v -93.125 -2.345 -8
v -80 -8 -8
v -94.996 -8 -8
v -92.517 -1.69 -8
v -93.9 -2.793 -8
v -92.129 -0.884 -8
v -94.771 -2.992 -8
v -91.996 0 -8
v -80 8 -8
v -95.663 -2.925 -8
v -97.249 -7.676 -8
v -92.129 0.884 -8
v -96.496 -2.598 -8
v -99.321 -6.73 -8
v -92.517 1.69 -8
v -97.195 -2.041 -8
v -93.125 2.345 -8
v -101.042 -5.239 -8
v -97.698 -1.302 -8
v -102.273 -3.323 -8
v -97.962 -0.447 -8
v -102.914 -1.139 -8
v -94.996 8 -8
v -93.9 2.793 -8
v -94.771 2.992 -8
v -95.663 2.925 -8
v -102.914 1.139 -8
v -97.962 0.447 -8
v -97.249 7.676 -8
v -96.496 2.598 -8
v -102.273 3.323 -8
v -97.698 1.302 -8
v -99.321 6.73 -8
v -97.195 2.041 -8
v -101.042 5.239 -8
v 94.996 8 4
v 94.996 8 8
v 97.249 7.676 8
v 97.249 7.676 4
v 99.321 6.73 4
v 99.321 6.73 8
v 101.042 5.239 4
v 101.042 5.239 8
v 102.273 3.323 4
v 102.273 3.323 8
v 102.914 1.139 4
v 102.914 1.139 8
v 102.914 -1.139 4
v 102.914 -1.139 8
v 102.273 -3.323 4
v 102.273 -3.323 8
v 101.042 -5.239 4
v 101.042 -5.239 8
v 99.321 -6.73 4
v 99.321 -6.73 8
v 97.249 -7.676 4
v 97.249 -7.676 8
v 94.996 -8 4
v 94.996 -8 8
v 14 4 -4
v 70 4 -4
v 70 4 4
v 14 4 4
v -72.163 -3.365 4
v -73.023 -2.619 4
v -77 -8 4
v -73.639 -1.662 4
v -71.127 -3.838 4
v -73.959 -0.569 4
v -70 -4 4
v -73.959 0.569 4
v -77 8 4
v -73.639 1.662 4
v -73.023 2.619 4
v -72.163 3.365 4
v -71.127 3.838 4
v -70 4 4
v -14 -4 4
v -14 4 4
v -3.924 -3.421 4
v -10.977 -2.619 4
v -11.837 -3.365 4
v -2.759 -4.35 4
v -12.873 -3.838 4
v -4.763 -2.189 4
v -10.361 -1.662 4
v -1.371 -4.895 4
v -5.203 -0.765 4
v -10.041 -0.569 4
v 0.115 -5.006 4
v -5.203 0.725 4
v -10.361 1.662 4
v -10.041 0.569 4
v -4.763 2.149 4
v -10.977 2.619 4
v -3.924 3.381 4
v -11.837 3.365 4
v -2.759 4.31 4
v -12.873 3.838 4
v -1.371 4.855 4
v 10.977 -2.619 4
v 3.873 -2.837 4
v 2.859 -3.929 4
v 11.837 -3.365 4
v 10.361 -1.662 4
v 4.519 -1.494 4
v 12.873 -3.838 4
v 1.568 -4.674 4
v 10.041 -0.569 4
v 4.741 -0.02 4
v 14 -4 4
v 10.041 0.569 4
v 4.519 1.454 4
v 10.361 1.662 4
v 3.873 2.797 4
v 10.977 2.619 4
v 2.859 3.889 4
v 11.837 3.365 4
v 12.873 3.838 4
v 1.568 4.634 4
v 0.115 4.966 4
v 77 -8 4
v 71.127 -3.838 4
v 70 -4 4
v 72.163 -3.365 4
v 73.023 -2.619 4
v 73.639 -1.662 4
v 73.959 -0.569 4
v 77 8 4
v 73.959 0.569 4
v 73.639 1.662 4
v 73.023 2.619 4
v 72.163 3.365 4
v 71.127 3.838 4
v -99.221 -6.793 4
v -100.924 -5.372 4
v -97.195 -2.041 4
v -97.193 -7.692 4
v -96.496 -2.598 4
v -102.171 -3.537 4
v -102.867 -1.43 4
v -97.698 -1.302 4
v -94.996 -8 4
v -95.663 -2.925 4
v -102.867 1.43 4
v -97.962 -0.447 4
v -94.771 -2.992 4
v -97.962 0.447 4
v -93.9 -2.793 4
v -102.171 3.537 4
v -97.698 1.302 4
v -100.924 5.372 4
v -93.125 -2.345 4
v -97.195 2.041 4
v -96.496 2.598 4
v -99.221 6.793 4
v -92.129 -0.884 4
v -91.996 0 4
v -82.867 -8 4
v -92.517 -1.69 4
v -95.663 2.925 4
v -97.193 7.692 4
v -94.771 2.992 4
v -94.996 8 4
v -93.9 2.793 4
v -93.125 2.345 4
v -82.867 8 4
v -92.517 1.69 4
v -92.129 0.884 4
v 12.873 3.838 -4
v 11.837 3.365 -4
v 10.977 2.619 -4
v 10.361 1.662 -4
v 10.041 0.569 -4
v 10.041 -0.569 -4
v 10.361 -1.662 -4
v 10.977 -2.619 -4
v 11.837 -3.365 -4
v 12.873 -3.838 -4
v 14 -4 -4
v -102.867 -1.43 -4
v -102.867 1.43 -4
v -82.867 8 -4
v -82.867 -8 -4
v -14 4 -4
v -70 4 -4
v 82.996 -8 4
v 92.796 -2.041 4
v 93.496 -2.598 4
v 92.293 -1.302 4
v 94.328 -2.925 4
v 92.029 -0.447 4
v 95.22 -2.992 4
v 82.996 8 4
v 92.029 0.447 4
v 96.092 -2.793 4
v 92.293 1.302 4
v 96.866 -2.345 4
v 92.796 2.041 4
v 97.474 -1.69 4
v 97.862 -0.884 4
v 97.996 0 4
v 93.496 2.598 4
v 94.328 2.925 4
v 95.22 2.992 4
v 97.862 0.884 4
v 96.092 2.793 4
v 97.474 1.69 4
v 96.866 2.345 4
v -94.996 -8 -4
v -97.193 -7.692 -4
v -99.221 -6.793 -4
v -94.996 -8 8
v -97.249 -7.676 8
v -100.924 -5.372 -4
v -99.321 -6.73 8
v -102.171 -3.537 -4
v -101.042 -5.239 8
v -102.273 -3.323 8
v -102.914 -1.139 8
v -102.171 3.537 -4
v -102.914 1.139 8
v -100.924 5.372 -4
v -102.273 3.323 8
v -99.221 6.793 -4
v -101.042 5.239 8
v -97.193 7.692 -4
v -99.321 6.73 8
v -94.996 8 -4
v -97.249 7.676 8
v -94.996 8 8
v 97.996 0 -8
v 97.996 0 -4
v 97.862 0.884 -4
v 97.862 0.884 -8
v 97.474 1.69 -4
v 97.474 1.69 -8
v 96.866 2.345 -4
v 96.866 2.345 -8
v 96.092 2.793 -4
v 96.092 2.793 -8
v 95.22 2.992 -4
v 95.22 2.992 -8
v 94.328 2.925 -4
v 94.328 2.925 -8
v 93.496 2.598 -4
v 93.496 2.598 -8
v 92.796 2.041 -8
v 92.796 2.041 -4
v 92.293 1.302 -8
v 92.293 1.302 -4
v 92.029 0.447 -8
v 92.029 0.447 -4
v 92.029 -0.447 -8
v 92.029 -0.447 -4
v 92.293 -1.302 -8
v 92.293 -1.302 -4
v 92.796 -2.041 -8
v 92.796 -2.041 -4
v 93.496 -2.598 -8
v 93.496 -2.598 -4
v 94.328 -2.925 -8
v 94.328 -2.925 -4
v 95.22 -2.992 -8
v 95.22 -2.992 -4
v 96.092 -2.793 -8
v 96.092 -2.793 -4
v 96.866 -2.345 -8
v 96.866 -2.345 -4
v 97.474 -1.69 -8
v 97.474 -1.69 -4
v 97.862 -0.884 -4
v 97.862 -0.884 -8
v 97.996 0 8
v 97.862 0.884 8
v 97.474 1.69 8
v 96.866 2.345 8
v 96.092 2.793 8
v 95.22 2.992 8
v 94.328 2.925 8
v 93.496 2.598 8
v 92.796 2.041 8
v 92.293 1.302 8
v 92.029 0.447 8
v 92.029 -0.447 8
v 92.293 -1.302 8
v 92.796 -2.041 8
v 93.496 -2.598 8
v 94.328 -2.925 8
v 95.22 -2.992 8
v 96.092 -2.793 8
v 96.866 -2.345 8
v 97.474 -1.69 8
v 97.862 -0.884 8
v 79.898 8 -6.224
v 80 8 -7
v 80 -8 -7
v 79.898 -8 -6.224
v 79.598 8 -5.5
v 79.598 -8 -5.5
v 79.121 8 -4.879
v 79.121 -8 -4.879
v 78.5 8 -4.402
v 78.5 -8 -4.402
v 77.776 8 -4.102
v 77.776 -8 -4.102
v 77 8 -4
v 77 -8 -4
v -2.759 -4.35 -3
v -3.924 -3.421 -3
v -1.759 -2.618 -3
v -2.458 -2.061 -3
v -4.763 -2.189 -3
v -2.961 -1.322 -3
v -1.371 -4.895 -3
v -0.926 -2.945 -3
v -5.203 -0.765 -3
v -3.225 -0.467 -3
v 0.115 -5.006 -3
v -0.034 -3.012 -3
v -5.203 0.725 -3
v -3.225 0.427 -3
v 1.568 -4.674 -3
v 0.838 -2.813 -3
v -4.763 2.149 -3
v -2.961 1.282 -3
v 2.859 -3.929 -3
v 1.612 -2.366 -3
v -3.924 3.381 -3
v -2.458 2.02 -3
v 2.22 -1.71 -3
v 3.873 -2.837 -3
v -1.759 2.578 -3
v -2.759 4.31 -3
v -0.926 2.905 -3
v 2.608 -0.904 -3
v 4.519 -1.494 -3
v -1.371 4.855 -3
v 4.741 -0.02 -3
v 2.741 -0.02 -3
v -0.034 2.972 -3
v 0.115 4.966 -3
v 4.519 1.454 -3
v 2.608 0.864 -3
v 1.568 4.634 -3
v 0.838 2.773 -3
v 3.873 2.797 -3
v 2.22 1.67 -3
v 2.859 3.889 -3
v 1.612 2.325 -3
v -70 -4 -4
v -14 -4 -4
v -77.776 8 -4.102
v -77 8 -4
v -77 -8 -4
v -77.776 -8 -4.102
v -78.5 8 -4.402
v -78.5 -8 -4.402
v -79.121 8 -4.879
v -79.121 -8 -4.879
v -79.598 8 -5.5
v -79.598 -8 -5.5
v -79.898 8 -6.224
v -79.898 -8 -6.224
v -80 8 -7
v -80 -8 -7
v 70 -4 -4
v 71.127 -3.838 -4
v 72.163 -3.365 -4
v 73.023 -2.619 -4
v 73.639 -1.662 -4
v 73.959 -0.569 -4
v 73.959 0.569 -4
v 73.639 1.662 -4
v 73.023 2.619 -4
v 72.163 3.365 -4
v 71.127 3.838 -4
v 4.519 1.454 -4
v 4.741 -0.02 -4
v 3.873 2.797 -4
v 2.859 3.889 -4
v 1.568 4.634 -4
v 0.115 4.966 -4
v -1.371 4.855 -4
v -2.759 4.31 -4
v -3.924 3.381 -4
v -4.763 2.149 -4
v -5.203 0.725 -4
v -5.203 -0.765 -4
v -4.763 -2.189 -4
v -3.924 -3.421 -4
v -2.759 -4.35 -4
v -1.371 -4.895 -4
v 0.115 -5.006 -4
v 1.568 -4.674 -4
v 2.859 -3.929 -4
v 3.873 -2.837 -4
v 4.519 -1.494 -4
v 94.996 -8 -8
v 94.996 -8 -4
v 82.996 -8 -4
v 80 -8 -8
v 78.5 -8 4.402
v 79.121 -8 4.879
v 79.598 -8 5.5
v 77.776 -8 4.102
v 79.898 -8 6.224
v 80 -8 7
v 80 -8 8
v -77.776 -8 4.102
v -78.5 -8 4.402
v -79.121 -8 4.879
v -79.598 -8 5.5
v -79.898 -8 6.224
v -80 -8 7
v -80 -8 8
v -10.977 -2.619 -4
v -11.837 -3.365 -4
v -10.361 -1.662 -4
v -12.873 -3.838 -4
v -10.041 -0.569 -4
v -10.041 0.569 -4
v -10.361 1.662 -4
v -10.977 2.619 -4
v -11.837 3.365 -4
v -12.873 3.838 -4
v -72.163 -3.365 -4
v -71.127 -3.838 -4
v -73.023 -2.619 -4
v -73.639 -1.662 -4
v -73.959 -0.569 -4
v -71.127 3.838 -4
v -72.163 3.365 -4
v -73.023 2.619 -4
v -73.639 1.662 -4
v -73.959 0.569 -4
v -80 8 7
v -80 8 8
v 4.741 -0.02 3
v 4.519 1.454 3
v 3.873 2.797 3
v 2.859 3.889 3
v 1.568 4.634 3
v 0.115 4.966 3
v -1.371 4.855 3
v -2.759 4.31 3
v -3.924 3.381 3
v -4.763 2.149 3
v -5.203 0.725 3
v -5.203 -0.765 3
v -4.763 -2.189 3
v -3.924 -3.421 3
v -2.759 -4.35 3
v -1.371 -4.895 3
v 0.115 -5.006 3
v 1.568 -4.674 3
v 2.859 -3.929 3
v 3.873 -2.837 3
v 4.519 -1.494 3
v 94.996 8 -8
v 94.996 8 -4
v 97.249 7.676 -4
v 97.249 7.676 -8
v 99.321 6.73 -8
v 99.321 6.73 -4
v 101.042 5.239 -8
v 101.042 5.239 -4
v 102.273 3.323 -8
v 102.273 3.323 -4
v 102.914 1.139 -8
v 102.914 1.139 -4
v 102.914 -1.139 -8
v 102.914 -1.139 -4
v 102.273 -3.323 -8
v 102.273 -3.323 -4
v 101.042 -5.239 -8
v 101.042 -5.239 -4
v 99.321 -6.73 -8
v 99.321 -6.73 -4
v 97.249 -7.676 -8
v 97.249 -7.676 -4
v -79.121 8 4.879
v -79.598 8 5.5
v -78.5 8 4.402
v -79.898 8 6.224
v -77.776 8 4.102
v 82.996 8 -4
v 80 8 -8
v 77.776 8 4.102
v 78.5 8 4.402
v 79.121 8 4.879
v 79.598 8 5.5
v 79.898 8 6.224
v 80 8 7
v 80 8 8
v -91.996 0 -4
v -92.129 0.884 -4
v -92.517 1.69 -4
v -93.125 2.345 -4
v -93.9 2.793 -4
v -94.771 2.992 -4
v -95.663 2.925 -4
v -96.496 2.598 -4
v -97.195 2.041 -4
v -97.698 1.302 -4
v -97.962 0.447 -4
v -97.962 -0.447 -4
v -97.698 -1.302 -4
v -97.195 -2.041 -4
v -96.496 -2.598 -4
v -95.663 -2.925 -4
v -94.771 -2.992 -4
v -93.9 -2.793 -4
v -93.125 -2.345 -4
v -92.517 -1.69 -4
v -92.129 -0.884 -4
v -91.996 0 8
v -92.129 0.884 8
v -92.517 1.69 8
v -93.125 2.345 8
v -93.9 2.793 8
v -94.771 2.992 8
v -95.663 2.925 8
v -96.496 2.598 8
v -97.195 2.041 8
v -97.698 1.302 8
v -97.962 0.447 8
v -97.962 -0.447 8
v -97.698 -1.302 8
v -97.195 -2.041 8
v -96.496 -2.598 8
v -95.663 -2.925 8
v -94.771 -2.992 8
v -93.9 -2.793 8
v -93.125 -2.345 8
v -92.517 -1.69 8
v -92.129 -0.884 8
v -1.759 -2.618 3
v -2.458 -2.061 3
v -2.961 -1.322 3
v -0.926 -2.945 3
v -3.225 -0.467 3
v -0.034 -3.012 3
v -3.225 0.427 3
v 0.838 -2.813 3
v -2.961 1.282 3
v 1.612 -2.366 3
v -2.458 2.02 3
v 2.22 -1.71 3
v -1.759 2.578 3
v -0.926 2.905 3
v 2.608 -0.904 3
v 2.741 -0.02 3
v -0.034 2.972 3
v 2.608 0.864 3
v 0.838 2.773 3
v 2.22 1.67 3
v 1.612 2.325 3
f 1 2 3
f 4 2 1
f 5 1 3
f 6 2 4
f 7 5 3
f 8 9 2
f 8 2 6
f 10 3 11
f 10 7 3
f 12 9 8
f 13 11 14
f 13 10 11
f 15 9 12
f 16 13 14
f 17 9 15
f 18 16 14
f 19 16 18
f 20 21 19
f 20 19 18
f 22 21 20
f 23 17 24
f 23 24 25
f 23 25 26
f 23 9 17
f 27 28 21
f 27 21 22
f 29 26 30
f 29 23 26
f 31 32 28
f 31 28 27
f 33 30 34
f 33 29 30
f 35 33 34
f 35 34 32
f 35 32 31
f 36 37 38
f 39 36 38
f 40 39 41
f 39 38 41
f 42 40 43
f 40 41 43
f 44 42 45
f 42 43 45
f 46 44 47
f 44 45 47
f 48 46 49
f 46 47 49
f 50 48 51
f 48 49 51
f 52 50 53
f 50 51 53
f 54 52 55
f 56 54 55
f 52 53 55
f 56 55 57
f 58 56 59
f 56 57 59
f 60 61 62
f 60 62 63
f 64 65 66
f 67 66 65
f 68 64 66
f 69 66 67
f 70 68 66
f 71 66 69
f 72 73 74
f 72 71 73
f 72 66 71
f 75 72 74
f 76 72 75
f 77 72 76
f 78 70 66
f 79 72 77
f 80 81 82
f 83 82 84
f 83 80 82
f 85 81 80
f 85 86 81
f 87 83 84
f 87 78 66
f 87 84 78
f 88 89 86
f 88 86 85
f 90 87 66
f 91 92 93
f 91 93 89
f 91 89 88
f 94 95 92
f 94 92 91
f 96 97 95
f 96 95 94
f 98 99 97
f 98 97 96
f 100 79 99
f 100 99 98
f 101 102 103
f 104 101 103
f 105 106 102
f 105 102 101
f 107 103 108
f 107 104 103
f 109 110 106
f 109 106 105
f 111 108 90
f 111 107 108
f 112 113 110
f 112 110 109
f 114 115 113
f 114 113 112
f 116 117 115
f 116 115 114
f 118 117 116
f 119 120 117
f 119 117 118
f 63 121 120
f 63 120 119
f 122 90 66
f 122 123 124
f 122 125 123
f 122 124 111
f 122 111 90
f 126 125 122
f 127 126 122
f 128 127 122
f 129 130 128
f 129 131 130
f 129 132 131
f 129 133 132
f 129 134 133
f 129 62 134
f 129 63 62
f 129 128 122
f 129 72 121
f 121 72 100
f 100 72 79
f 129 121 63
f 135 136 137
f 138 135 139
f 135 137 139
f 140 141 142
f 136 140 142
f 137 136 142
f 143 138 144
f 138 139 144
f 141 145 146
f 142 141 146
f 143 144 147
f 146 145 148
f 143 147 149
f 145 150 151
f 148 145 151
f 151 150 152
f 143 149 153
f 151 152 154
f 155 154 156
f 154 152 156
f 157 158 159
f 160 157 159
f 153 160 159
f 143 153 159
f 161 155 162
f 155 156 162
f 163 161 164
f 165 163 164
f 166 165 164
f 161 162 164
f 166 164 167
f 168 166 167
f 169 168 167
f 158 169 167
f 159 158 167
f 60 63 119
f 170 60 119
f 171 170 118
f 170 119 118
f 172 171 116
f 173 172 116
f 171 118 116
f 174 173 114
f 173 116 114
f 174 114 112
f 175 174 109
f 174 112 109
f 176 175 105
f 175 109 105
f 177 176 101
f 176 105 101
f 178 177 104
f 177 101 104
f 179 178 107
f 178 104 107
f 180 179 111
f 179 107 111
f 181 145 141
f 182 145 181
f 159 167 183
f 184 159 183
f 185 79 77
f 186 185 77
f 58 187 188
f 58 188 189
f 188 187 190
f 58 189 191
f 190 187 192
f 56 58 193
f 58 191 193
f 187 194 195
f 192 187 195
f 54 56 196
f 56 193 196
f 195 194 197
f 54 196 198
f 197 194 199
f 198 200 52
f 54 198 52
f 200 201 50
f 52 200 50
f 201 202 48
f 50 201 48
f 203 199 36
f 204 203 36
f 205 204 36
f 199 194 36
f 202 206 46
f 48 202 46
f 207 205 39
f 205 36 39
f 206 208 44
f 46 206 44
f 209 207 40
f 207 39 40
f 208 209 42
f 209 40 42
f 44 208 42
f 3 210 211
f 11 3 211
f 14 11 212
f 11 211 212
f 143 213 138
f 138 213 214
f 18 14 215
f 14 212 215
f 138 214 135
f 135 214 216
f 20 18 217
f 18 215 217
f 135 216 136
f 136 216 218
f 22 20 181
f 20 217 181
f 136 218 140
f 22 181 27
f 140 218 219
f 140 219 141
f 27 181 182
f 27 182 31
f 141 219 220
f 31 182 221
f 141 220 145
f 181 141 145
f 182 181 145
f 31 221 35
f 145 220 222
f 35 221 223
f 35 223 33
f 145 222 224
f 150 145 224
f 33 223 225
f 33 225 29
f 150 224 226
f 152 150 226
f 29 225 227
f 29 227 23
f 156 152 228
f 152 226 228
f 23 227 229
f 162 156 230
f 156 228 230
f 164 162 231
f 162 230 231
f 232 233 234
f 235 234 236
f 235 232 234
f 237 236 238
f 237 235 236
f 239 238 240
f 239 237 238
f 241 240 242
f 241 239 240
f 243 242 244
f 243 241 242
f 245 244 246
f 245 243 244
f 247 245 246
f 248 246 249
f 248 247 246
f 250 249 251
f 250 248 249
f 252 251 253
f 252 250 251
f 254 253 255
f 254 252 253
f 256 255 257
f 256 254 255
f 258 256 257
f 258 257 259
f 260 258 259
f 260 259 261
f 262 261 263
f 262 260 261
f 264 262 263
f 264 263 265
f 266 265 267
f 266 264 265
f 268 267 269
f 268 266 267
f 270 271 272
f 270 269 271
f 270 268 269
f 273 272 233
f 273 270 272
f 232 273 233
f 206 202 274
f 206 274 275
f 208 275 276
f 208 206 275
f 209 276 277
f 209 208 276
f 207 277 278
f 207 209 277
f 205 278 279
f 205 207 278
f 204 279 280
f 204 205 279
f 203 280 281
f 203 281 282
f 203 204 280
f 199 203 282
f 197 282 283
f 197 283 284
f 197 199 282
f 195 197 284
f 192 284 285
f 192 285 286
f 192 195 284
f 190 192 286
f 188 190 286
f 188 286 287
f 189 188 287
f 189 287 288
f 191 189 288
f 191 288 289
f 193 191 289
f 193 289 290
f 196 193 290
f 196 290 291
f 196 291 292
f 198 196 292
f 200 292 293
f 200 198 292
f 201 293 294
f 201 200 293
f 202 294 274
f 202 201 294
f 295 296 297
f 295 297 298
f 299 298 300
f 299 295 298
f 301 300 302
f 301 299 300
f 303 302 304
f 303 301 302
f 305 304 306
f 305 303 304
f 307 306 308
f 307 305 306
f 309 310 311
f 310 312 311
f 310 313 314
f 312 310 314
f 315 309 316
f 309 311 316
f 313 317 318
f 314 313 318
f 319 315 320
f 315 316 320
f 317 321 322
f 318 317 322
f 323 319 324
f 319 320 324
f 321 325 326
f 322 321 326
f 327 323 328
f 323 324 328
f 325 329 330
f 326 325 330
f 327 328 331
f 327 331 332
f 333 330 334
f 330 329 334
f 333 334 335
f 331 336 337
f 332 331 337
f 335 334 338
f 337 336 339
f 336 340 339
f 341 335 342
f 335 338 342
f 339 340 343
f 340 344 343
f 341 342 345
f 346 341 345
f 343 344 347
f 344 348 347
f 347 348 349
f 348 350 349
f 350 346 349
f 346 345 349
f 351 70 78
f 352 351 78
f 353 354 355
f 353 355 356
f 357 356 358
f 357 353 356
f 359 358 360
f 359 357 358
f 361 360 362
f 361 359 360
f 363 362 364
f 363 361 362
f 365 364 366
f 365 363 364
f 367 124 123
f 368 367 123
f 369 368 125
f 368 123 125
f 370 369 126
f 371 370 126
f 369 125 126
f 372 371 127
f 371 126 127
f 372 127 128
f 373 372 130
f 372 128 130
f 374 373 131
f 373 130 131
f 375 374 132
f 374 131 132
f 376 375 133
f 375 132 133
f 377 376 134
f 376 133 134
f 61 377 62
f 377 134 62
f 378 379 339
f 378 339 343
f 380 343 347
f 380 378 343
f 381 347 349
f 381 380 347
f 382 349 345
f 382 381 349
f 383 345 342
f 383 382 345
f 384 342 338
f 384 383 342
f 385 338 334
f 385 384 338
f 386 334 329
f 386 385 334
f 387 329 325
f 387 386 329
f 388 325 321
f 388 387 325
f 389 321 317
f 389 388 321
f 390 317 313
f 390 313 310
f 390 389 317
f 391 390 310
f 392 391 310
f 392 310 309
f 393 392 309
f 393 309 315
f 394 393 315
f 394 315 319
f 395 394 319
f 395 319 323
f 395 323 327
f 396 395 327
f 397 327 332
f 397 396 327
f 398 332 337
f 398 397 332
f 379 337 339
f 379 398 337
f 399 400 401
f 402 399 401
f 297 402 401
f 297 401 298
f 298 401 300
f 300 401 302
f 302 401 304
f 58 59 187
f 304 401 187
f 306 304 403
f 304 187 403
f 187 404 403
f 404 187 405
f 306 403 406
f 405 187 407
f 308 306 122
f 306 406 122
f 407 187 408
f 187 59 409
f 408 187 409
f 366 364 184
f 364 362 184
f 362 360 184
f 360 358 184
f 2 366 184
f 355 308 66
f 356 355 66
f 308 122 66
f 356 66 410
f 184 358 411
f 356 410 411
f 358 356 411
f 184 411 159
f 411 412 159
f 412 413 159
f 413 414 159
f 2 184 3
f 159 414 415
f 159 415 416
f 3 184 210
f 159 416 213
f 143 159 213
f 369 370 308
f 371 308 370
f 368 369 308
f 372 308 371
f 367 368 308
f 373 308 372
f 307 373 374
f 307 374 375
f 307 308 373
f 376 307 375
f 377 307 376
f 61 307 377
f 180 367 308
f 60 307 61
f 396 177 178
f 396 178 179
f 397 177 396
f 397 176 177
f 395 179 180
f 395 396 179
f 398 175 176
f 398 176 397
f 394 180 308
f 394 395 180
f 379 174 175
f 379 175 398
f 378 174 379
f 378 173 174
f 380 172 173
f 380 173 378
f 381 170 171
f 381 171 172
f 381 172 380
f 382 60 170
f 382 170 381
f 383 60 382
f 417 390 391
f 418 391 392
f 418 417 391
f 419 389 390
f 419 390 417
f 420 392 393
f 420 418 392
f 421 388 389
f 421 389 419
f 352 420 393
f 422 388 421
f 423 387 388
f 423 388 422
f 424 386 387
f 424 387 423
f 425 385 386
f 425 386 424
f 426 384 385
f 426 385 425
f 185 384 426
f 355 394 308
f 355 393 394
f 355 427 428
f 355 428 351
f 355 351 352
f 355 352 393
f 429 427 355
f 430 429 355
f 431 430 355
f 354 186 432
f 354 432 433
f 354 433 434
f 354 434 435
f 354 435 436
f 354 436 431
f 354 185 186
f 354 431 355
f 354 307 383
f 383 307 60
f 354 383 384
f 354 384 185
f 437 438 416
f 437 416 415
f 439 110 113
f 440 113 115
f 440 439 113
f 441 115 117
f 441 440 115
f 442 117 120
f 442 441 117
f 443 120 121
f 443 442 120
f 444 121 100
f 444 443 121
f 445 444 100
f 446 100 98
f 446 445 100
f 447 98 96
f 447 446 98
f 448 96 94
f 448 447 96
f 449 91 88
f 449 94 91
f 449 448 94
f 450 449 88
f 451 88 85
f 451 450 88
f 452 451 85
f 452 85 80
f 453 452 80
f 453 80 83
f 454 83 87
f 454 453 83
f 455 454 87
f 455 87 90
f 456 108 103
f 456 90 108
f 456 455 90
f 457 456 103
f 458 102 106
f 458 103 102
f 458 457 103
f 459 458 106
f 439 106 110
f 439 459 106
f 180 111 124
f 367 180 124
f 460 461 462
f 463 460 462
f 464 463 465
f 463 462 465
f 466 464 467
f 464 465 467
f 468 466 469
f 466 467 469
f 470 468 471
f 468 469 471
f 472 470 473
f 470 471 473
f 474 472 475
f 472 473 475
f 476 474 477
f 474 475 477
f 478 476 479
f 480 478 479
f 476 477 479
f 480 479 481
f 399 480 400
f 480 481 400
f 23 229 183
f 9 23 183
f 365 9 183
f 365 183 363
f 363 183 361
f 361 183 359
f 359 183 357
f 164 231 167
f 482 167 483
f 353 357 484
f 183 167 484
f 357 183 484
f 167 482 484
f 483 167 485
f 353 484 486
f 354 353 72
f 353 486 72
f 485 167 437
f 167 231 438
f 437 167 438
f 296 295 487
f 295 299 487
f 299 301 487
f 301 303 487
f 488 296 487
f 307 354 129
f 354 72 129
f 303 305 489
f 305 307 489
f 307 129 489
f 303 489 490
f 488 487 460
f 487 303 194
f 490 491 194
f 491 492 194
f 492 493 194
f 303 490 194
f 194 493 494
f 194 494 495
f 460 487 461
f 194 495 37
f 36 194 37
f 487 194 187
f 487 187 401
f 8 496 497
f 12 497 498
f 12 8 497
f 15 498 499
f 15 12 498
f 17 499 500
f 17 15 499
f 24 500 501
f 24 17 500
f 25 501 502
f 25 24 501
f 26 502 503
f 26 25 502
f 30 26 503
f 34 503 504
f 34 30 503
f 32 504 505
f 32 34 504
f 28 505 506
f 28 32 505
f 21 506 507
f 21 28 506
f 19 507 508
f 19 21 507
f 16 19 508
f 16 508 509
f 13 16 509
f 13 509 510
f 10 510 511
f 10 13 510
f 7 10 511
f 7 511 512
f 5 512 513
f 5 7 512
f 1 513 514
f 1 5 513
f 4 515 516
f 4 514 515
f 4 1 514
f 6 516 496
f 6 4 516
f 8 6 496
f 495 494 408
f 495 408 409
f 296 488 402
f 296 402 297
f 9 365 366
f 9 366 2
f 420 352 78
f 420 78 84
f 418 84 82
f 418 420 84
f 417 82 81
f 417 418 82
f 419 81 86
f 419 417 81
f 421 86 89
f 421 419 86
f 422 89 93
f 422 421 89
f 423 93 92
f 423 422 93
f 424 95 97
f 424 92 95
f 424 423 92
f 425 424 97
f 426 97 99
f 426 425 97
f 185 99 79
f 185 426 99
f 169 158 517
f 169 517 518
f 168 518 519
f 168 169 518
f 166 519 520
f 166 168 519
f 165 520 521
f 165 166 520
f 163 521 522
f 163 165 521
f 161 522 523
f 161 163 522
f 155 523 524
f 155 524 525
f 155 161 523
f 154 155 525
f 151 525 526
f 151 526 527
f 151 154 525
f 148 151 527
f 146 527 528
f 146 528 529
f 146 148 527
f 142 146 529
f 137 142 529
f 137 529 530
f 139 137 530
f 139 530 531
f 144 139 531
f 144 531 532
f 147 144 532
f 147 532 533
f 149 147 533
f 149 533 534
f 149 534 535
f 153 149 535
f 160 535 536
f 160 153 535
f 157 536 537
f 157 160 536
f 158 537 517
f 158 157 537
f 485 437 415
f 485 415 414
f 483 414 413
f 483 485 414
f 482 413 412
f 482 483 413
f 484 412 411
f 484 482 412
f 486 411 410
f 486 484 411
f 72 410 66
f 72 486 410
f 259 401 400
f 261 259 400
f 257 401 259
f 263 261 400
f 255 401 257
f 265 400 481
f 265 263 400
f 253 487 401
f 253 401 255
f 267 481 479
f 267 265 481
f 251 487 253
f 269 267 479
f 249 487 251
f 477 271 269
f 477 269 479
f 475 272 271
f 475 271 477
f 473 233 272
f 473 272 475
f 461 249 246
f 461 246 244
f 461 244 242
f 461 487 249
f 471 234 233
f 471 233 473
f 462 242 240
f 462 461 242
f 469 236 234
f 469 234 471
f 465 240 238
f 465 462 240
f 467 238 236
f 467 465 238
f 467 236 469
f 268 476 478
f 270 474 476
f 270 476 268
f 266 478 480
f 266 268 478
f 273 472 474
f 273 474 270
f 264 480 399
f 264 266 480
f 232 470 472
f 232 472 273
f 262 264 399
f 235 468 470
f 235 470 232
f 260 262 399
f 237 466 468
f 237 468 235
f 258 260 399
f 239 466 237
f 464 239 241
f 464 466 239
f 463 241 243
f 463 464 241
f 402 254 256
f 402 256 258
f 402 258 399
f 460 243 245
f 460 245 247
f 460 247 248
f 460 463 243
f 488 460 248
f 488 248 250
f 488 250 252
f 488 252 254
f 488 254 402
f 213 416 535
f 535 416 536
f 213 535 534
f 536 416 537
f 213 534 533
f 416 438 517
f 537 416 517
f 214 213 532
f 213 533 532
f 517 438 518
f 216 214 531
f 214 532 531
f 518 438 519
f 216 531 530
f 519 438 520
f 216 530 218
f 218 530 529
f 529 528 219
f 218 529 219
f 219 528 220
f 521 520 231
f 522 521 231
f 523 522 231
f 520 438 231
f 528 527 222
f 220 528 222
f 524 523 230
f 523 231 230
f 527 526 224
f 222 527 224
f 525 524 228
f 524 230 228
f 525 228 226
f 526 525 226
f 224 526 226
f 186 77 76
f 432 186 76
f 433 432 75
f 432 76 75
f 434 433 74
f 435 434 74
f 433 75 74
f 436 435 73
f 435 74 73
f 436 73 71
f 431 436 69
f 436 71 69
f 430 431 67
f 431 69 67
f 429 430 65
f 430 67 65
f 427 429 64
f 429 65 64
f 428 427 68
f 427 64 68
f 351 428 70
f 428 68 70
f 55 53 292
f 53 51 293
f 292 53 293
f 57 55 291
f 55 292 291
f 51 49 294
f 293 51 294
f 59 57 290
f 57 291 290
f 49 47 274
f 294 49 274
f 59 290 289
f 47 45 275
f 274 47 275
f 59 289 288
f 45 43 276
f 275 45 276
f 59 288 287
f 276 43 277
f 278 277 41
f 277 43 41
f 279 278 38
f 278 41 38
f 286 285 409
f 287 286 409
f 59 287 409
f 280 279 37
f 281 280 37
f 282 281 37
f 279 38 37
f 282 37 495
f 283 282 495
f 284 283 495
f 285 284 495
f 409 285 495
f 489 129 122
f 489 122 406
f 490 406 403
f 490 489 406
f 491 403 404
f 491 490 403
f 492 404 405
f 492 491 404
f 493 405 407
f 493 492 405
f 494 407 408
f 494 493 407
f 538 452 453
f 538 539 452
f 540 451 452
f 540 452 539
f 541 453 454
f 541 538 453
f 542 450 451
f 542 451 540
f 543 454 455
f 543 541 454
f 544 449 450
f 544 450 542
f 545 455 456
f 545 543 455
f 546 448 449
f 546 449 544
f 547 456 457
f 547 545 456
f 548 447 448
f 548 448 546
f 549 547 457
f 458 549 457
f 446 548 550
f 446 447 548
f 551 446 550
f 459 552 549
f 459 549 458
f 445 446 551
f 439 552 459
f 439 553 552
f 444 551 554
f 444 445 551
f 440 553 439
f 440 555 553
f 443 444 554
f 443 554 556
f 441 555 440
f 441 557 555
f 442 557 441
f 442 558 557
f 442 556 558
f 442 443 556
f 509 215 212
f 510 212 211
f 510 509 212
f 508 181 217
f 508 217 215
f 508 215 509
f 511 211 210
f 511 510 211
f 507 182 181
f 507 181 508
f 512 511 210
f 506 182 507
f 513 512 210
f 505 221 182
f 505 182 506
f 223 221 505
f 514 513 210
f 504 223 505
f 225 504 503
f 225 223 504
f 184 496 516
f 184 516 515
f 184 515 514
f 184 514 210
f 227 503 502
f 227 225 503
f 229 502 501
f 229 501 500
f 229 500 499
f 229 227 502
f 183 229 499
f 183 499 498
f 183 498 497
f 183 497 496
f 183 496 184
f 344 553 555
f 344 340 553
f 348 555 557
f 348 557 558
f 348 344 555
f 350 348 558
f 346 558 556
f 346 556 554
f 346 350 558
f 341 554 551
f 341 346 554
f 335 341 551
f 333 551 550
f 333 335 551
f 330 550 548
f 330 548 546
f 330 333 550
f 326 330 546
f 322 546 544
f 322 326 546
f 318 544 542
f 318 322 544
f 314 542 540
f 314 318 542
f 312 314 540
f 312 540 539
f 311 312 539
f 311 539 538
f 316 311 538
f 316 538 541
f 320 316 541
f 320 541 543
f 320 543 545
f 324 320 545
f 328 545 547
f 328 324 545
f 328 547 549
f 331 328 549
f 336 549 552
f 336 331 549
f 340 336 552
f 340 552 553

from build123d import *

# Parameters (mm, degrees)
SKETCH1_R           = 3
SKETCH1_R_2         = 5
BOSS_EXTRUDE1_DEPTH = 8
SKETCH1_4_R         = 5
SKETCH1_4_R_2       = 3
BOSS_EXTRUDE2_DEPTH = 3
SKETCH2_W           = 20
SKETCH2_H           = 8
CUT_EXTRUDE2_DEPTH  = 105.537509551


with BuildPart() as part:
    # Sketch1 → Boss-Extrude1 (new, symmetric)
    with BuildSketch(Plane.XY):
        with BuildLine():
            ThreePointArc((94.995586814, -8), (102.995586814, 0), (94.995586814, 8))
            Line((94.995586814, 8), (-94.995586814, 8))
            ThreePointArc((-94.995586814, 8), (-102.995586814, 0), (-94.995586814, -8))
            Line((-94.995586814, -8), (94.995586814, -8))
        make_face()
        with Locations((-94.995586814, 0)):
            Circle(SKETCH1_R, mode=Mode.SUBTRACT)
        with Locations((-0.258516261, -0.020052265)):
            Circle(SKETCH1_R_2, mode=Mode.SUBTRACT)
        with BuildLine():
            ThreePointArc((-70, -4), (-74, 0), (-70, 4))
            Line((-70, 4), (-14, 4))
            ThreePointArc((-14, 4), (-10, 0), (-14, -4))
            Line((-14, -4), (-70, -4))
        make_face(mode=Mode.SUBTRACT)
        with BuildLine():
            ThreePointArc((14, -4), (10, 0), (14, 4))
            Line((14, 4), (70, 4))
            ThreePointArc((70, 4), (74, 0), (70, -4))
            Line((70, -4), (14, -4))
        make_face(mode=Mode.SUBTRACT)
        with Locations((94.995586814, 0)):
            Circle(SKETCH1_R, mode=Mode.SUBTRACT)
    extrude(amount=BOSS_EXTRUDE1_DEPTH, both=True)

    # Sketch1<4> → Boss-Extrude2 (add, symmetric)
    with BuildSketch(Plane.XY):
        with Locations((-0.258516261, -0.020052265)):
            Circle(SKETCH1_4_R)
        with Locations((-0.258516261, -0.020052265)):
            Circle(SKETCH1_4_R_2, mode=Mode.SUBTRACT)
    extrude(amount=BOSS_EXTRUDE2_DEPTH, both=True)

    # Sketch2 → Cut-Extrude2 (cut, through all)
    with BuildSketch(Plane(origin=(0, 8, 0), x_dir=(1, 0, 0), z_dir=(0, 1, 0))):
        with BuildLine():
            Line((-80, 8), (80, 8))
            Line((80, 8), (80, 7))
            ThreePointArc((80, 7), (79.121320344, 4.878679656), (77, 4))
            Line((77, 4), (-77, 4))
            ThreePointArc((-77, 4), (-79.121320344, 4.878679656), (-80, 7))
            Line((-80, 7), (-80, 8))
        make_face()
        with BuildLine():
            Line((80, -8), (-80, -8))
            Line((-80, -8), (-80, -7))
            ThreePointArc((-80, -7), (-79.121320344, -4.878679656), (-77, -4))
            Line((-77, -4), (77, -4))
            ThreePointArc((77, -4), (79.121320344, -4.878679656), (80, -7))
            Line((80, -7), (80, -8))
        make_face()
        with Locations((-92.866692646, 0)):
            Rectangle(SKETCH2_W, SKETCH2_H)
        with Locations((92.995586814, 0)):
            Rectangle(SKETCH2_W, SKETCH2_H)
    extrude(amount=-CUT_EXTRUDE2_DEPTH, mode=Mode.SUBTRACT)


solid = part.part
